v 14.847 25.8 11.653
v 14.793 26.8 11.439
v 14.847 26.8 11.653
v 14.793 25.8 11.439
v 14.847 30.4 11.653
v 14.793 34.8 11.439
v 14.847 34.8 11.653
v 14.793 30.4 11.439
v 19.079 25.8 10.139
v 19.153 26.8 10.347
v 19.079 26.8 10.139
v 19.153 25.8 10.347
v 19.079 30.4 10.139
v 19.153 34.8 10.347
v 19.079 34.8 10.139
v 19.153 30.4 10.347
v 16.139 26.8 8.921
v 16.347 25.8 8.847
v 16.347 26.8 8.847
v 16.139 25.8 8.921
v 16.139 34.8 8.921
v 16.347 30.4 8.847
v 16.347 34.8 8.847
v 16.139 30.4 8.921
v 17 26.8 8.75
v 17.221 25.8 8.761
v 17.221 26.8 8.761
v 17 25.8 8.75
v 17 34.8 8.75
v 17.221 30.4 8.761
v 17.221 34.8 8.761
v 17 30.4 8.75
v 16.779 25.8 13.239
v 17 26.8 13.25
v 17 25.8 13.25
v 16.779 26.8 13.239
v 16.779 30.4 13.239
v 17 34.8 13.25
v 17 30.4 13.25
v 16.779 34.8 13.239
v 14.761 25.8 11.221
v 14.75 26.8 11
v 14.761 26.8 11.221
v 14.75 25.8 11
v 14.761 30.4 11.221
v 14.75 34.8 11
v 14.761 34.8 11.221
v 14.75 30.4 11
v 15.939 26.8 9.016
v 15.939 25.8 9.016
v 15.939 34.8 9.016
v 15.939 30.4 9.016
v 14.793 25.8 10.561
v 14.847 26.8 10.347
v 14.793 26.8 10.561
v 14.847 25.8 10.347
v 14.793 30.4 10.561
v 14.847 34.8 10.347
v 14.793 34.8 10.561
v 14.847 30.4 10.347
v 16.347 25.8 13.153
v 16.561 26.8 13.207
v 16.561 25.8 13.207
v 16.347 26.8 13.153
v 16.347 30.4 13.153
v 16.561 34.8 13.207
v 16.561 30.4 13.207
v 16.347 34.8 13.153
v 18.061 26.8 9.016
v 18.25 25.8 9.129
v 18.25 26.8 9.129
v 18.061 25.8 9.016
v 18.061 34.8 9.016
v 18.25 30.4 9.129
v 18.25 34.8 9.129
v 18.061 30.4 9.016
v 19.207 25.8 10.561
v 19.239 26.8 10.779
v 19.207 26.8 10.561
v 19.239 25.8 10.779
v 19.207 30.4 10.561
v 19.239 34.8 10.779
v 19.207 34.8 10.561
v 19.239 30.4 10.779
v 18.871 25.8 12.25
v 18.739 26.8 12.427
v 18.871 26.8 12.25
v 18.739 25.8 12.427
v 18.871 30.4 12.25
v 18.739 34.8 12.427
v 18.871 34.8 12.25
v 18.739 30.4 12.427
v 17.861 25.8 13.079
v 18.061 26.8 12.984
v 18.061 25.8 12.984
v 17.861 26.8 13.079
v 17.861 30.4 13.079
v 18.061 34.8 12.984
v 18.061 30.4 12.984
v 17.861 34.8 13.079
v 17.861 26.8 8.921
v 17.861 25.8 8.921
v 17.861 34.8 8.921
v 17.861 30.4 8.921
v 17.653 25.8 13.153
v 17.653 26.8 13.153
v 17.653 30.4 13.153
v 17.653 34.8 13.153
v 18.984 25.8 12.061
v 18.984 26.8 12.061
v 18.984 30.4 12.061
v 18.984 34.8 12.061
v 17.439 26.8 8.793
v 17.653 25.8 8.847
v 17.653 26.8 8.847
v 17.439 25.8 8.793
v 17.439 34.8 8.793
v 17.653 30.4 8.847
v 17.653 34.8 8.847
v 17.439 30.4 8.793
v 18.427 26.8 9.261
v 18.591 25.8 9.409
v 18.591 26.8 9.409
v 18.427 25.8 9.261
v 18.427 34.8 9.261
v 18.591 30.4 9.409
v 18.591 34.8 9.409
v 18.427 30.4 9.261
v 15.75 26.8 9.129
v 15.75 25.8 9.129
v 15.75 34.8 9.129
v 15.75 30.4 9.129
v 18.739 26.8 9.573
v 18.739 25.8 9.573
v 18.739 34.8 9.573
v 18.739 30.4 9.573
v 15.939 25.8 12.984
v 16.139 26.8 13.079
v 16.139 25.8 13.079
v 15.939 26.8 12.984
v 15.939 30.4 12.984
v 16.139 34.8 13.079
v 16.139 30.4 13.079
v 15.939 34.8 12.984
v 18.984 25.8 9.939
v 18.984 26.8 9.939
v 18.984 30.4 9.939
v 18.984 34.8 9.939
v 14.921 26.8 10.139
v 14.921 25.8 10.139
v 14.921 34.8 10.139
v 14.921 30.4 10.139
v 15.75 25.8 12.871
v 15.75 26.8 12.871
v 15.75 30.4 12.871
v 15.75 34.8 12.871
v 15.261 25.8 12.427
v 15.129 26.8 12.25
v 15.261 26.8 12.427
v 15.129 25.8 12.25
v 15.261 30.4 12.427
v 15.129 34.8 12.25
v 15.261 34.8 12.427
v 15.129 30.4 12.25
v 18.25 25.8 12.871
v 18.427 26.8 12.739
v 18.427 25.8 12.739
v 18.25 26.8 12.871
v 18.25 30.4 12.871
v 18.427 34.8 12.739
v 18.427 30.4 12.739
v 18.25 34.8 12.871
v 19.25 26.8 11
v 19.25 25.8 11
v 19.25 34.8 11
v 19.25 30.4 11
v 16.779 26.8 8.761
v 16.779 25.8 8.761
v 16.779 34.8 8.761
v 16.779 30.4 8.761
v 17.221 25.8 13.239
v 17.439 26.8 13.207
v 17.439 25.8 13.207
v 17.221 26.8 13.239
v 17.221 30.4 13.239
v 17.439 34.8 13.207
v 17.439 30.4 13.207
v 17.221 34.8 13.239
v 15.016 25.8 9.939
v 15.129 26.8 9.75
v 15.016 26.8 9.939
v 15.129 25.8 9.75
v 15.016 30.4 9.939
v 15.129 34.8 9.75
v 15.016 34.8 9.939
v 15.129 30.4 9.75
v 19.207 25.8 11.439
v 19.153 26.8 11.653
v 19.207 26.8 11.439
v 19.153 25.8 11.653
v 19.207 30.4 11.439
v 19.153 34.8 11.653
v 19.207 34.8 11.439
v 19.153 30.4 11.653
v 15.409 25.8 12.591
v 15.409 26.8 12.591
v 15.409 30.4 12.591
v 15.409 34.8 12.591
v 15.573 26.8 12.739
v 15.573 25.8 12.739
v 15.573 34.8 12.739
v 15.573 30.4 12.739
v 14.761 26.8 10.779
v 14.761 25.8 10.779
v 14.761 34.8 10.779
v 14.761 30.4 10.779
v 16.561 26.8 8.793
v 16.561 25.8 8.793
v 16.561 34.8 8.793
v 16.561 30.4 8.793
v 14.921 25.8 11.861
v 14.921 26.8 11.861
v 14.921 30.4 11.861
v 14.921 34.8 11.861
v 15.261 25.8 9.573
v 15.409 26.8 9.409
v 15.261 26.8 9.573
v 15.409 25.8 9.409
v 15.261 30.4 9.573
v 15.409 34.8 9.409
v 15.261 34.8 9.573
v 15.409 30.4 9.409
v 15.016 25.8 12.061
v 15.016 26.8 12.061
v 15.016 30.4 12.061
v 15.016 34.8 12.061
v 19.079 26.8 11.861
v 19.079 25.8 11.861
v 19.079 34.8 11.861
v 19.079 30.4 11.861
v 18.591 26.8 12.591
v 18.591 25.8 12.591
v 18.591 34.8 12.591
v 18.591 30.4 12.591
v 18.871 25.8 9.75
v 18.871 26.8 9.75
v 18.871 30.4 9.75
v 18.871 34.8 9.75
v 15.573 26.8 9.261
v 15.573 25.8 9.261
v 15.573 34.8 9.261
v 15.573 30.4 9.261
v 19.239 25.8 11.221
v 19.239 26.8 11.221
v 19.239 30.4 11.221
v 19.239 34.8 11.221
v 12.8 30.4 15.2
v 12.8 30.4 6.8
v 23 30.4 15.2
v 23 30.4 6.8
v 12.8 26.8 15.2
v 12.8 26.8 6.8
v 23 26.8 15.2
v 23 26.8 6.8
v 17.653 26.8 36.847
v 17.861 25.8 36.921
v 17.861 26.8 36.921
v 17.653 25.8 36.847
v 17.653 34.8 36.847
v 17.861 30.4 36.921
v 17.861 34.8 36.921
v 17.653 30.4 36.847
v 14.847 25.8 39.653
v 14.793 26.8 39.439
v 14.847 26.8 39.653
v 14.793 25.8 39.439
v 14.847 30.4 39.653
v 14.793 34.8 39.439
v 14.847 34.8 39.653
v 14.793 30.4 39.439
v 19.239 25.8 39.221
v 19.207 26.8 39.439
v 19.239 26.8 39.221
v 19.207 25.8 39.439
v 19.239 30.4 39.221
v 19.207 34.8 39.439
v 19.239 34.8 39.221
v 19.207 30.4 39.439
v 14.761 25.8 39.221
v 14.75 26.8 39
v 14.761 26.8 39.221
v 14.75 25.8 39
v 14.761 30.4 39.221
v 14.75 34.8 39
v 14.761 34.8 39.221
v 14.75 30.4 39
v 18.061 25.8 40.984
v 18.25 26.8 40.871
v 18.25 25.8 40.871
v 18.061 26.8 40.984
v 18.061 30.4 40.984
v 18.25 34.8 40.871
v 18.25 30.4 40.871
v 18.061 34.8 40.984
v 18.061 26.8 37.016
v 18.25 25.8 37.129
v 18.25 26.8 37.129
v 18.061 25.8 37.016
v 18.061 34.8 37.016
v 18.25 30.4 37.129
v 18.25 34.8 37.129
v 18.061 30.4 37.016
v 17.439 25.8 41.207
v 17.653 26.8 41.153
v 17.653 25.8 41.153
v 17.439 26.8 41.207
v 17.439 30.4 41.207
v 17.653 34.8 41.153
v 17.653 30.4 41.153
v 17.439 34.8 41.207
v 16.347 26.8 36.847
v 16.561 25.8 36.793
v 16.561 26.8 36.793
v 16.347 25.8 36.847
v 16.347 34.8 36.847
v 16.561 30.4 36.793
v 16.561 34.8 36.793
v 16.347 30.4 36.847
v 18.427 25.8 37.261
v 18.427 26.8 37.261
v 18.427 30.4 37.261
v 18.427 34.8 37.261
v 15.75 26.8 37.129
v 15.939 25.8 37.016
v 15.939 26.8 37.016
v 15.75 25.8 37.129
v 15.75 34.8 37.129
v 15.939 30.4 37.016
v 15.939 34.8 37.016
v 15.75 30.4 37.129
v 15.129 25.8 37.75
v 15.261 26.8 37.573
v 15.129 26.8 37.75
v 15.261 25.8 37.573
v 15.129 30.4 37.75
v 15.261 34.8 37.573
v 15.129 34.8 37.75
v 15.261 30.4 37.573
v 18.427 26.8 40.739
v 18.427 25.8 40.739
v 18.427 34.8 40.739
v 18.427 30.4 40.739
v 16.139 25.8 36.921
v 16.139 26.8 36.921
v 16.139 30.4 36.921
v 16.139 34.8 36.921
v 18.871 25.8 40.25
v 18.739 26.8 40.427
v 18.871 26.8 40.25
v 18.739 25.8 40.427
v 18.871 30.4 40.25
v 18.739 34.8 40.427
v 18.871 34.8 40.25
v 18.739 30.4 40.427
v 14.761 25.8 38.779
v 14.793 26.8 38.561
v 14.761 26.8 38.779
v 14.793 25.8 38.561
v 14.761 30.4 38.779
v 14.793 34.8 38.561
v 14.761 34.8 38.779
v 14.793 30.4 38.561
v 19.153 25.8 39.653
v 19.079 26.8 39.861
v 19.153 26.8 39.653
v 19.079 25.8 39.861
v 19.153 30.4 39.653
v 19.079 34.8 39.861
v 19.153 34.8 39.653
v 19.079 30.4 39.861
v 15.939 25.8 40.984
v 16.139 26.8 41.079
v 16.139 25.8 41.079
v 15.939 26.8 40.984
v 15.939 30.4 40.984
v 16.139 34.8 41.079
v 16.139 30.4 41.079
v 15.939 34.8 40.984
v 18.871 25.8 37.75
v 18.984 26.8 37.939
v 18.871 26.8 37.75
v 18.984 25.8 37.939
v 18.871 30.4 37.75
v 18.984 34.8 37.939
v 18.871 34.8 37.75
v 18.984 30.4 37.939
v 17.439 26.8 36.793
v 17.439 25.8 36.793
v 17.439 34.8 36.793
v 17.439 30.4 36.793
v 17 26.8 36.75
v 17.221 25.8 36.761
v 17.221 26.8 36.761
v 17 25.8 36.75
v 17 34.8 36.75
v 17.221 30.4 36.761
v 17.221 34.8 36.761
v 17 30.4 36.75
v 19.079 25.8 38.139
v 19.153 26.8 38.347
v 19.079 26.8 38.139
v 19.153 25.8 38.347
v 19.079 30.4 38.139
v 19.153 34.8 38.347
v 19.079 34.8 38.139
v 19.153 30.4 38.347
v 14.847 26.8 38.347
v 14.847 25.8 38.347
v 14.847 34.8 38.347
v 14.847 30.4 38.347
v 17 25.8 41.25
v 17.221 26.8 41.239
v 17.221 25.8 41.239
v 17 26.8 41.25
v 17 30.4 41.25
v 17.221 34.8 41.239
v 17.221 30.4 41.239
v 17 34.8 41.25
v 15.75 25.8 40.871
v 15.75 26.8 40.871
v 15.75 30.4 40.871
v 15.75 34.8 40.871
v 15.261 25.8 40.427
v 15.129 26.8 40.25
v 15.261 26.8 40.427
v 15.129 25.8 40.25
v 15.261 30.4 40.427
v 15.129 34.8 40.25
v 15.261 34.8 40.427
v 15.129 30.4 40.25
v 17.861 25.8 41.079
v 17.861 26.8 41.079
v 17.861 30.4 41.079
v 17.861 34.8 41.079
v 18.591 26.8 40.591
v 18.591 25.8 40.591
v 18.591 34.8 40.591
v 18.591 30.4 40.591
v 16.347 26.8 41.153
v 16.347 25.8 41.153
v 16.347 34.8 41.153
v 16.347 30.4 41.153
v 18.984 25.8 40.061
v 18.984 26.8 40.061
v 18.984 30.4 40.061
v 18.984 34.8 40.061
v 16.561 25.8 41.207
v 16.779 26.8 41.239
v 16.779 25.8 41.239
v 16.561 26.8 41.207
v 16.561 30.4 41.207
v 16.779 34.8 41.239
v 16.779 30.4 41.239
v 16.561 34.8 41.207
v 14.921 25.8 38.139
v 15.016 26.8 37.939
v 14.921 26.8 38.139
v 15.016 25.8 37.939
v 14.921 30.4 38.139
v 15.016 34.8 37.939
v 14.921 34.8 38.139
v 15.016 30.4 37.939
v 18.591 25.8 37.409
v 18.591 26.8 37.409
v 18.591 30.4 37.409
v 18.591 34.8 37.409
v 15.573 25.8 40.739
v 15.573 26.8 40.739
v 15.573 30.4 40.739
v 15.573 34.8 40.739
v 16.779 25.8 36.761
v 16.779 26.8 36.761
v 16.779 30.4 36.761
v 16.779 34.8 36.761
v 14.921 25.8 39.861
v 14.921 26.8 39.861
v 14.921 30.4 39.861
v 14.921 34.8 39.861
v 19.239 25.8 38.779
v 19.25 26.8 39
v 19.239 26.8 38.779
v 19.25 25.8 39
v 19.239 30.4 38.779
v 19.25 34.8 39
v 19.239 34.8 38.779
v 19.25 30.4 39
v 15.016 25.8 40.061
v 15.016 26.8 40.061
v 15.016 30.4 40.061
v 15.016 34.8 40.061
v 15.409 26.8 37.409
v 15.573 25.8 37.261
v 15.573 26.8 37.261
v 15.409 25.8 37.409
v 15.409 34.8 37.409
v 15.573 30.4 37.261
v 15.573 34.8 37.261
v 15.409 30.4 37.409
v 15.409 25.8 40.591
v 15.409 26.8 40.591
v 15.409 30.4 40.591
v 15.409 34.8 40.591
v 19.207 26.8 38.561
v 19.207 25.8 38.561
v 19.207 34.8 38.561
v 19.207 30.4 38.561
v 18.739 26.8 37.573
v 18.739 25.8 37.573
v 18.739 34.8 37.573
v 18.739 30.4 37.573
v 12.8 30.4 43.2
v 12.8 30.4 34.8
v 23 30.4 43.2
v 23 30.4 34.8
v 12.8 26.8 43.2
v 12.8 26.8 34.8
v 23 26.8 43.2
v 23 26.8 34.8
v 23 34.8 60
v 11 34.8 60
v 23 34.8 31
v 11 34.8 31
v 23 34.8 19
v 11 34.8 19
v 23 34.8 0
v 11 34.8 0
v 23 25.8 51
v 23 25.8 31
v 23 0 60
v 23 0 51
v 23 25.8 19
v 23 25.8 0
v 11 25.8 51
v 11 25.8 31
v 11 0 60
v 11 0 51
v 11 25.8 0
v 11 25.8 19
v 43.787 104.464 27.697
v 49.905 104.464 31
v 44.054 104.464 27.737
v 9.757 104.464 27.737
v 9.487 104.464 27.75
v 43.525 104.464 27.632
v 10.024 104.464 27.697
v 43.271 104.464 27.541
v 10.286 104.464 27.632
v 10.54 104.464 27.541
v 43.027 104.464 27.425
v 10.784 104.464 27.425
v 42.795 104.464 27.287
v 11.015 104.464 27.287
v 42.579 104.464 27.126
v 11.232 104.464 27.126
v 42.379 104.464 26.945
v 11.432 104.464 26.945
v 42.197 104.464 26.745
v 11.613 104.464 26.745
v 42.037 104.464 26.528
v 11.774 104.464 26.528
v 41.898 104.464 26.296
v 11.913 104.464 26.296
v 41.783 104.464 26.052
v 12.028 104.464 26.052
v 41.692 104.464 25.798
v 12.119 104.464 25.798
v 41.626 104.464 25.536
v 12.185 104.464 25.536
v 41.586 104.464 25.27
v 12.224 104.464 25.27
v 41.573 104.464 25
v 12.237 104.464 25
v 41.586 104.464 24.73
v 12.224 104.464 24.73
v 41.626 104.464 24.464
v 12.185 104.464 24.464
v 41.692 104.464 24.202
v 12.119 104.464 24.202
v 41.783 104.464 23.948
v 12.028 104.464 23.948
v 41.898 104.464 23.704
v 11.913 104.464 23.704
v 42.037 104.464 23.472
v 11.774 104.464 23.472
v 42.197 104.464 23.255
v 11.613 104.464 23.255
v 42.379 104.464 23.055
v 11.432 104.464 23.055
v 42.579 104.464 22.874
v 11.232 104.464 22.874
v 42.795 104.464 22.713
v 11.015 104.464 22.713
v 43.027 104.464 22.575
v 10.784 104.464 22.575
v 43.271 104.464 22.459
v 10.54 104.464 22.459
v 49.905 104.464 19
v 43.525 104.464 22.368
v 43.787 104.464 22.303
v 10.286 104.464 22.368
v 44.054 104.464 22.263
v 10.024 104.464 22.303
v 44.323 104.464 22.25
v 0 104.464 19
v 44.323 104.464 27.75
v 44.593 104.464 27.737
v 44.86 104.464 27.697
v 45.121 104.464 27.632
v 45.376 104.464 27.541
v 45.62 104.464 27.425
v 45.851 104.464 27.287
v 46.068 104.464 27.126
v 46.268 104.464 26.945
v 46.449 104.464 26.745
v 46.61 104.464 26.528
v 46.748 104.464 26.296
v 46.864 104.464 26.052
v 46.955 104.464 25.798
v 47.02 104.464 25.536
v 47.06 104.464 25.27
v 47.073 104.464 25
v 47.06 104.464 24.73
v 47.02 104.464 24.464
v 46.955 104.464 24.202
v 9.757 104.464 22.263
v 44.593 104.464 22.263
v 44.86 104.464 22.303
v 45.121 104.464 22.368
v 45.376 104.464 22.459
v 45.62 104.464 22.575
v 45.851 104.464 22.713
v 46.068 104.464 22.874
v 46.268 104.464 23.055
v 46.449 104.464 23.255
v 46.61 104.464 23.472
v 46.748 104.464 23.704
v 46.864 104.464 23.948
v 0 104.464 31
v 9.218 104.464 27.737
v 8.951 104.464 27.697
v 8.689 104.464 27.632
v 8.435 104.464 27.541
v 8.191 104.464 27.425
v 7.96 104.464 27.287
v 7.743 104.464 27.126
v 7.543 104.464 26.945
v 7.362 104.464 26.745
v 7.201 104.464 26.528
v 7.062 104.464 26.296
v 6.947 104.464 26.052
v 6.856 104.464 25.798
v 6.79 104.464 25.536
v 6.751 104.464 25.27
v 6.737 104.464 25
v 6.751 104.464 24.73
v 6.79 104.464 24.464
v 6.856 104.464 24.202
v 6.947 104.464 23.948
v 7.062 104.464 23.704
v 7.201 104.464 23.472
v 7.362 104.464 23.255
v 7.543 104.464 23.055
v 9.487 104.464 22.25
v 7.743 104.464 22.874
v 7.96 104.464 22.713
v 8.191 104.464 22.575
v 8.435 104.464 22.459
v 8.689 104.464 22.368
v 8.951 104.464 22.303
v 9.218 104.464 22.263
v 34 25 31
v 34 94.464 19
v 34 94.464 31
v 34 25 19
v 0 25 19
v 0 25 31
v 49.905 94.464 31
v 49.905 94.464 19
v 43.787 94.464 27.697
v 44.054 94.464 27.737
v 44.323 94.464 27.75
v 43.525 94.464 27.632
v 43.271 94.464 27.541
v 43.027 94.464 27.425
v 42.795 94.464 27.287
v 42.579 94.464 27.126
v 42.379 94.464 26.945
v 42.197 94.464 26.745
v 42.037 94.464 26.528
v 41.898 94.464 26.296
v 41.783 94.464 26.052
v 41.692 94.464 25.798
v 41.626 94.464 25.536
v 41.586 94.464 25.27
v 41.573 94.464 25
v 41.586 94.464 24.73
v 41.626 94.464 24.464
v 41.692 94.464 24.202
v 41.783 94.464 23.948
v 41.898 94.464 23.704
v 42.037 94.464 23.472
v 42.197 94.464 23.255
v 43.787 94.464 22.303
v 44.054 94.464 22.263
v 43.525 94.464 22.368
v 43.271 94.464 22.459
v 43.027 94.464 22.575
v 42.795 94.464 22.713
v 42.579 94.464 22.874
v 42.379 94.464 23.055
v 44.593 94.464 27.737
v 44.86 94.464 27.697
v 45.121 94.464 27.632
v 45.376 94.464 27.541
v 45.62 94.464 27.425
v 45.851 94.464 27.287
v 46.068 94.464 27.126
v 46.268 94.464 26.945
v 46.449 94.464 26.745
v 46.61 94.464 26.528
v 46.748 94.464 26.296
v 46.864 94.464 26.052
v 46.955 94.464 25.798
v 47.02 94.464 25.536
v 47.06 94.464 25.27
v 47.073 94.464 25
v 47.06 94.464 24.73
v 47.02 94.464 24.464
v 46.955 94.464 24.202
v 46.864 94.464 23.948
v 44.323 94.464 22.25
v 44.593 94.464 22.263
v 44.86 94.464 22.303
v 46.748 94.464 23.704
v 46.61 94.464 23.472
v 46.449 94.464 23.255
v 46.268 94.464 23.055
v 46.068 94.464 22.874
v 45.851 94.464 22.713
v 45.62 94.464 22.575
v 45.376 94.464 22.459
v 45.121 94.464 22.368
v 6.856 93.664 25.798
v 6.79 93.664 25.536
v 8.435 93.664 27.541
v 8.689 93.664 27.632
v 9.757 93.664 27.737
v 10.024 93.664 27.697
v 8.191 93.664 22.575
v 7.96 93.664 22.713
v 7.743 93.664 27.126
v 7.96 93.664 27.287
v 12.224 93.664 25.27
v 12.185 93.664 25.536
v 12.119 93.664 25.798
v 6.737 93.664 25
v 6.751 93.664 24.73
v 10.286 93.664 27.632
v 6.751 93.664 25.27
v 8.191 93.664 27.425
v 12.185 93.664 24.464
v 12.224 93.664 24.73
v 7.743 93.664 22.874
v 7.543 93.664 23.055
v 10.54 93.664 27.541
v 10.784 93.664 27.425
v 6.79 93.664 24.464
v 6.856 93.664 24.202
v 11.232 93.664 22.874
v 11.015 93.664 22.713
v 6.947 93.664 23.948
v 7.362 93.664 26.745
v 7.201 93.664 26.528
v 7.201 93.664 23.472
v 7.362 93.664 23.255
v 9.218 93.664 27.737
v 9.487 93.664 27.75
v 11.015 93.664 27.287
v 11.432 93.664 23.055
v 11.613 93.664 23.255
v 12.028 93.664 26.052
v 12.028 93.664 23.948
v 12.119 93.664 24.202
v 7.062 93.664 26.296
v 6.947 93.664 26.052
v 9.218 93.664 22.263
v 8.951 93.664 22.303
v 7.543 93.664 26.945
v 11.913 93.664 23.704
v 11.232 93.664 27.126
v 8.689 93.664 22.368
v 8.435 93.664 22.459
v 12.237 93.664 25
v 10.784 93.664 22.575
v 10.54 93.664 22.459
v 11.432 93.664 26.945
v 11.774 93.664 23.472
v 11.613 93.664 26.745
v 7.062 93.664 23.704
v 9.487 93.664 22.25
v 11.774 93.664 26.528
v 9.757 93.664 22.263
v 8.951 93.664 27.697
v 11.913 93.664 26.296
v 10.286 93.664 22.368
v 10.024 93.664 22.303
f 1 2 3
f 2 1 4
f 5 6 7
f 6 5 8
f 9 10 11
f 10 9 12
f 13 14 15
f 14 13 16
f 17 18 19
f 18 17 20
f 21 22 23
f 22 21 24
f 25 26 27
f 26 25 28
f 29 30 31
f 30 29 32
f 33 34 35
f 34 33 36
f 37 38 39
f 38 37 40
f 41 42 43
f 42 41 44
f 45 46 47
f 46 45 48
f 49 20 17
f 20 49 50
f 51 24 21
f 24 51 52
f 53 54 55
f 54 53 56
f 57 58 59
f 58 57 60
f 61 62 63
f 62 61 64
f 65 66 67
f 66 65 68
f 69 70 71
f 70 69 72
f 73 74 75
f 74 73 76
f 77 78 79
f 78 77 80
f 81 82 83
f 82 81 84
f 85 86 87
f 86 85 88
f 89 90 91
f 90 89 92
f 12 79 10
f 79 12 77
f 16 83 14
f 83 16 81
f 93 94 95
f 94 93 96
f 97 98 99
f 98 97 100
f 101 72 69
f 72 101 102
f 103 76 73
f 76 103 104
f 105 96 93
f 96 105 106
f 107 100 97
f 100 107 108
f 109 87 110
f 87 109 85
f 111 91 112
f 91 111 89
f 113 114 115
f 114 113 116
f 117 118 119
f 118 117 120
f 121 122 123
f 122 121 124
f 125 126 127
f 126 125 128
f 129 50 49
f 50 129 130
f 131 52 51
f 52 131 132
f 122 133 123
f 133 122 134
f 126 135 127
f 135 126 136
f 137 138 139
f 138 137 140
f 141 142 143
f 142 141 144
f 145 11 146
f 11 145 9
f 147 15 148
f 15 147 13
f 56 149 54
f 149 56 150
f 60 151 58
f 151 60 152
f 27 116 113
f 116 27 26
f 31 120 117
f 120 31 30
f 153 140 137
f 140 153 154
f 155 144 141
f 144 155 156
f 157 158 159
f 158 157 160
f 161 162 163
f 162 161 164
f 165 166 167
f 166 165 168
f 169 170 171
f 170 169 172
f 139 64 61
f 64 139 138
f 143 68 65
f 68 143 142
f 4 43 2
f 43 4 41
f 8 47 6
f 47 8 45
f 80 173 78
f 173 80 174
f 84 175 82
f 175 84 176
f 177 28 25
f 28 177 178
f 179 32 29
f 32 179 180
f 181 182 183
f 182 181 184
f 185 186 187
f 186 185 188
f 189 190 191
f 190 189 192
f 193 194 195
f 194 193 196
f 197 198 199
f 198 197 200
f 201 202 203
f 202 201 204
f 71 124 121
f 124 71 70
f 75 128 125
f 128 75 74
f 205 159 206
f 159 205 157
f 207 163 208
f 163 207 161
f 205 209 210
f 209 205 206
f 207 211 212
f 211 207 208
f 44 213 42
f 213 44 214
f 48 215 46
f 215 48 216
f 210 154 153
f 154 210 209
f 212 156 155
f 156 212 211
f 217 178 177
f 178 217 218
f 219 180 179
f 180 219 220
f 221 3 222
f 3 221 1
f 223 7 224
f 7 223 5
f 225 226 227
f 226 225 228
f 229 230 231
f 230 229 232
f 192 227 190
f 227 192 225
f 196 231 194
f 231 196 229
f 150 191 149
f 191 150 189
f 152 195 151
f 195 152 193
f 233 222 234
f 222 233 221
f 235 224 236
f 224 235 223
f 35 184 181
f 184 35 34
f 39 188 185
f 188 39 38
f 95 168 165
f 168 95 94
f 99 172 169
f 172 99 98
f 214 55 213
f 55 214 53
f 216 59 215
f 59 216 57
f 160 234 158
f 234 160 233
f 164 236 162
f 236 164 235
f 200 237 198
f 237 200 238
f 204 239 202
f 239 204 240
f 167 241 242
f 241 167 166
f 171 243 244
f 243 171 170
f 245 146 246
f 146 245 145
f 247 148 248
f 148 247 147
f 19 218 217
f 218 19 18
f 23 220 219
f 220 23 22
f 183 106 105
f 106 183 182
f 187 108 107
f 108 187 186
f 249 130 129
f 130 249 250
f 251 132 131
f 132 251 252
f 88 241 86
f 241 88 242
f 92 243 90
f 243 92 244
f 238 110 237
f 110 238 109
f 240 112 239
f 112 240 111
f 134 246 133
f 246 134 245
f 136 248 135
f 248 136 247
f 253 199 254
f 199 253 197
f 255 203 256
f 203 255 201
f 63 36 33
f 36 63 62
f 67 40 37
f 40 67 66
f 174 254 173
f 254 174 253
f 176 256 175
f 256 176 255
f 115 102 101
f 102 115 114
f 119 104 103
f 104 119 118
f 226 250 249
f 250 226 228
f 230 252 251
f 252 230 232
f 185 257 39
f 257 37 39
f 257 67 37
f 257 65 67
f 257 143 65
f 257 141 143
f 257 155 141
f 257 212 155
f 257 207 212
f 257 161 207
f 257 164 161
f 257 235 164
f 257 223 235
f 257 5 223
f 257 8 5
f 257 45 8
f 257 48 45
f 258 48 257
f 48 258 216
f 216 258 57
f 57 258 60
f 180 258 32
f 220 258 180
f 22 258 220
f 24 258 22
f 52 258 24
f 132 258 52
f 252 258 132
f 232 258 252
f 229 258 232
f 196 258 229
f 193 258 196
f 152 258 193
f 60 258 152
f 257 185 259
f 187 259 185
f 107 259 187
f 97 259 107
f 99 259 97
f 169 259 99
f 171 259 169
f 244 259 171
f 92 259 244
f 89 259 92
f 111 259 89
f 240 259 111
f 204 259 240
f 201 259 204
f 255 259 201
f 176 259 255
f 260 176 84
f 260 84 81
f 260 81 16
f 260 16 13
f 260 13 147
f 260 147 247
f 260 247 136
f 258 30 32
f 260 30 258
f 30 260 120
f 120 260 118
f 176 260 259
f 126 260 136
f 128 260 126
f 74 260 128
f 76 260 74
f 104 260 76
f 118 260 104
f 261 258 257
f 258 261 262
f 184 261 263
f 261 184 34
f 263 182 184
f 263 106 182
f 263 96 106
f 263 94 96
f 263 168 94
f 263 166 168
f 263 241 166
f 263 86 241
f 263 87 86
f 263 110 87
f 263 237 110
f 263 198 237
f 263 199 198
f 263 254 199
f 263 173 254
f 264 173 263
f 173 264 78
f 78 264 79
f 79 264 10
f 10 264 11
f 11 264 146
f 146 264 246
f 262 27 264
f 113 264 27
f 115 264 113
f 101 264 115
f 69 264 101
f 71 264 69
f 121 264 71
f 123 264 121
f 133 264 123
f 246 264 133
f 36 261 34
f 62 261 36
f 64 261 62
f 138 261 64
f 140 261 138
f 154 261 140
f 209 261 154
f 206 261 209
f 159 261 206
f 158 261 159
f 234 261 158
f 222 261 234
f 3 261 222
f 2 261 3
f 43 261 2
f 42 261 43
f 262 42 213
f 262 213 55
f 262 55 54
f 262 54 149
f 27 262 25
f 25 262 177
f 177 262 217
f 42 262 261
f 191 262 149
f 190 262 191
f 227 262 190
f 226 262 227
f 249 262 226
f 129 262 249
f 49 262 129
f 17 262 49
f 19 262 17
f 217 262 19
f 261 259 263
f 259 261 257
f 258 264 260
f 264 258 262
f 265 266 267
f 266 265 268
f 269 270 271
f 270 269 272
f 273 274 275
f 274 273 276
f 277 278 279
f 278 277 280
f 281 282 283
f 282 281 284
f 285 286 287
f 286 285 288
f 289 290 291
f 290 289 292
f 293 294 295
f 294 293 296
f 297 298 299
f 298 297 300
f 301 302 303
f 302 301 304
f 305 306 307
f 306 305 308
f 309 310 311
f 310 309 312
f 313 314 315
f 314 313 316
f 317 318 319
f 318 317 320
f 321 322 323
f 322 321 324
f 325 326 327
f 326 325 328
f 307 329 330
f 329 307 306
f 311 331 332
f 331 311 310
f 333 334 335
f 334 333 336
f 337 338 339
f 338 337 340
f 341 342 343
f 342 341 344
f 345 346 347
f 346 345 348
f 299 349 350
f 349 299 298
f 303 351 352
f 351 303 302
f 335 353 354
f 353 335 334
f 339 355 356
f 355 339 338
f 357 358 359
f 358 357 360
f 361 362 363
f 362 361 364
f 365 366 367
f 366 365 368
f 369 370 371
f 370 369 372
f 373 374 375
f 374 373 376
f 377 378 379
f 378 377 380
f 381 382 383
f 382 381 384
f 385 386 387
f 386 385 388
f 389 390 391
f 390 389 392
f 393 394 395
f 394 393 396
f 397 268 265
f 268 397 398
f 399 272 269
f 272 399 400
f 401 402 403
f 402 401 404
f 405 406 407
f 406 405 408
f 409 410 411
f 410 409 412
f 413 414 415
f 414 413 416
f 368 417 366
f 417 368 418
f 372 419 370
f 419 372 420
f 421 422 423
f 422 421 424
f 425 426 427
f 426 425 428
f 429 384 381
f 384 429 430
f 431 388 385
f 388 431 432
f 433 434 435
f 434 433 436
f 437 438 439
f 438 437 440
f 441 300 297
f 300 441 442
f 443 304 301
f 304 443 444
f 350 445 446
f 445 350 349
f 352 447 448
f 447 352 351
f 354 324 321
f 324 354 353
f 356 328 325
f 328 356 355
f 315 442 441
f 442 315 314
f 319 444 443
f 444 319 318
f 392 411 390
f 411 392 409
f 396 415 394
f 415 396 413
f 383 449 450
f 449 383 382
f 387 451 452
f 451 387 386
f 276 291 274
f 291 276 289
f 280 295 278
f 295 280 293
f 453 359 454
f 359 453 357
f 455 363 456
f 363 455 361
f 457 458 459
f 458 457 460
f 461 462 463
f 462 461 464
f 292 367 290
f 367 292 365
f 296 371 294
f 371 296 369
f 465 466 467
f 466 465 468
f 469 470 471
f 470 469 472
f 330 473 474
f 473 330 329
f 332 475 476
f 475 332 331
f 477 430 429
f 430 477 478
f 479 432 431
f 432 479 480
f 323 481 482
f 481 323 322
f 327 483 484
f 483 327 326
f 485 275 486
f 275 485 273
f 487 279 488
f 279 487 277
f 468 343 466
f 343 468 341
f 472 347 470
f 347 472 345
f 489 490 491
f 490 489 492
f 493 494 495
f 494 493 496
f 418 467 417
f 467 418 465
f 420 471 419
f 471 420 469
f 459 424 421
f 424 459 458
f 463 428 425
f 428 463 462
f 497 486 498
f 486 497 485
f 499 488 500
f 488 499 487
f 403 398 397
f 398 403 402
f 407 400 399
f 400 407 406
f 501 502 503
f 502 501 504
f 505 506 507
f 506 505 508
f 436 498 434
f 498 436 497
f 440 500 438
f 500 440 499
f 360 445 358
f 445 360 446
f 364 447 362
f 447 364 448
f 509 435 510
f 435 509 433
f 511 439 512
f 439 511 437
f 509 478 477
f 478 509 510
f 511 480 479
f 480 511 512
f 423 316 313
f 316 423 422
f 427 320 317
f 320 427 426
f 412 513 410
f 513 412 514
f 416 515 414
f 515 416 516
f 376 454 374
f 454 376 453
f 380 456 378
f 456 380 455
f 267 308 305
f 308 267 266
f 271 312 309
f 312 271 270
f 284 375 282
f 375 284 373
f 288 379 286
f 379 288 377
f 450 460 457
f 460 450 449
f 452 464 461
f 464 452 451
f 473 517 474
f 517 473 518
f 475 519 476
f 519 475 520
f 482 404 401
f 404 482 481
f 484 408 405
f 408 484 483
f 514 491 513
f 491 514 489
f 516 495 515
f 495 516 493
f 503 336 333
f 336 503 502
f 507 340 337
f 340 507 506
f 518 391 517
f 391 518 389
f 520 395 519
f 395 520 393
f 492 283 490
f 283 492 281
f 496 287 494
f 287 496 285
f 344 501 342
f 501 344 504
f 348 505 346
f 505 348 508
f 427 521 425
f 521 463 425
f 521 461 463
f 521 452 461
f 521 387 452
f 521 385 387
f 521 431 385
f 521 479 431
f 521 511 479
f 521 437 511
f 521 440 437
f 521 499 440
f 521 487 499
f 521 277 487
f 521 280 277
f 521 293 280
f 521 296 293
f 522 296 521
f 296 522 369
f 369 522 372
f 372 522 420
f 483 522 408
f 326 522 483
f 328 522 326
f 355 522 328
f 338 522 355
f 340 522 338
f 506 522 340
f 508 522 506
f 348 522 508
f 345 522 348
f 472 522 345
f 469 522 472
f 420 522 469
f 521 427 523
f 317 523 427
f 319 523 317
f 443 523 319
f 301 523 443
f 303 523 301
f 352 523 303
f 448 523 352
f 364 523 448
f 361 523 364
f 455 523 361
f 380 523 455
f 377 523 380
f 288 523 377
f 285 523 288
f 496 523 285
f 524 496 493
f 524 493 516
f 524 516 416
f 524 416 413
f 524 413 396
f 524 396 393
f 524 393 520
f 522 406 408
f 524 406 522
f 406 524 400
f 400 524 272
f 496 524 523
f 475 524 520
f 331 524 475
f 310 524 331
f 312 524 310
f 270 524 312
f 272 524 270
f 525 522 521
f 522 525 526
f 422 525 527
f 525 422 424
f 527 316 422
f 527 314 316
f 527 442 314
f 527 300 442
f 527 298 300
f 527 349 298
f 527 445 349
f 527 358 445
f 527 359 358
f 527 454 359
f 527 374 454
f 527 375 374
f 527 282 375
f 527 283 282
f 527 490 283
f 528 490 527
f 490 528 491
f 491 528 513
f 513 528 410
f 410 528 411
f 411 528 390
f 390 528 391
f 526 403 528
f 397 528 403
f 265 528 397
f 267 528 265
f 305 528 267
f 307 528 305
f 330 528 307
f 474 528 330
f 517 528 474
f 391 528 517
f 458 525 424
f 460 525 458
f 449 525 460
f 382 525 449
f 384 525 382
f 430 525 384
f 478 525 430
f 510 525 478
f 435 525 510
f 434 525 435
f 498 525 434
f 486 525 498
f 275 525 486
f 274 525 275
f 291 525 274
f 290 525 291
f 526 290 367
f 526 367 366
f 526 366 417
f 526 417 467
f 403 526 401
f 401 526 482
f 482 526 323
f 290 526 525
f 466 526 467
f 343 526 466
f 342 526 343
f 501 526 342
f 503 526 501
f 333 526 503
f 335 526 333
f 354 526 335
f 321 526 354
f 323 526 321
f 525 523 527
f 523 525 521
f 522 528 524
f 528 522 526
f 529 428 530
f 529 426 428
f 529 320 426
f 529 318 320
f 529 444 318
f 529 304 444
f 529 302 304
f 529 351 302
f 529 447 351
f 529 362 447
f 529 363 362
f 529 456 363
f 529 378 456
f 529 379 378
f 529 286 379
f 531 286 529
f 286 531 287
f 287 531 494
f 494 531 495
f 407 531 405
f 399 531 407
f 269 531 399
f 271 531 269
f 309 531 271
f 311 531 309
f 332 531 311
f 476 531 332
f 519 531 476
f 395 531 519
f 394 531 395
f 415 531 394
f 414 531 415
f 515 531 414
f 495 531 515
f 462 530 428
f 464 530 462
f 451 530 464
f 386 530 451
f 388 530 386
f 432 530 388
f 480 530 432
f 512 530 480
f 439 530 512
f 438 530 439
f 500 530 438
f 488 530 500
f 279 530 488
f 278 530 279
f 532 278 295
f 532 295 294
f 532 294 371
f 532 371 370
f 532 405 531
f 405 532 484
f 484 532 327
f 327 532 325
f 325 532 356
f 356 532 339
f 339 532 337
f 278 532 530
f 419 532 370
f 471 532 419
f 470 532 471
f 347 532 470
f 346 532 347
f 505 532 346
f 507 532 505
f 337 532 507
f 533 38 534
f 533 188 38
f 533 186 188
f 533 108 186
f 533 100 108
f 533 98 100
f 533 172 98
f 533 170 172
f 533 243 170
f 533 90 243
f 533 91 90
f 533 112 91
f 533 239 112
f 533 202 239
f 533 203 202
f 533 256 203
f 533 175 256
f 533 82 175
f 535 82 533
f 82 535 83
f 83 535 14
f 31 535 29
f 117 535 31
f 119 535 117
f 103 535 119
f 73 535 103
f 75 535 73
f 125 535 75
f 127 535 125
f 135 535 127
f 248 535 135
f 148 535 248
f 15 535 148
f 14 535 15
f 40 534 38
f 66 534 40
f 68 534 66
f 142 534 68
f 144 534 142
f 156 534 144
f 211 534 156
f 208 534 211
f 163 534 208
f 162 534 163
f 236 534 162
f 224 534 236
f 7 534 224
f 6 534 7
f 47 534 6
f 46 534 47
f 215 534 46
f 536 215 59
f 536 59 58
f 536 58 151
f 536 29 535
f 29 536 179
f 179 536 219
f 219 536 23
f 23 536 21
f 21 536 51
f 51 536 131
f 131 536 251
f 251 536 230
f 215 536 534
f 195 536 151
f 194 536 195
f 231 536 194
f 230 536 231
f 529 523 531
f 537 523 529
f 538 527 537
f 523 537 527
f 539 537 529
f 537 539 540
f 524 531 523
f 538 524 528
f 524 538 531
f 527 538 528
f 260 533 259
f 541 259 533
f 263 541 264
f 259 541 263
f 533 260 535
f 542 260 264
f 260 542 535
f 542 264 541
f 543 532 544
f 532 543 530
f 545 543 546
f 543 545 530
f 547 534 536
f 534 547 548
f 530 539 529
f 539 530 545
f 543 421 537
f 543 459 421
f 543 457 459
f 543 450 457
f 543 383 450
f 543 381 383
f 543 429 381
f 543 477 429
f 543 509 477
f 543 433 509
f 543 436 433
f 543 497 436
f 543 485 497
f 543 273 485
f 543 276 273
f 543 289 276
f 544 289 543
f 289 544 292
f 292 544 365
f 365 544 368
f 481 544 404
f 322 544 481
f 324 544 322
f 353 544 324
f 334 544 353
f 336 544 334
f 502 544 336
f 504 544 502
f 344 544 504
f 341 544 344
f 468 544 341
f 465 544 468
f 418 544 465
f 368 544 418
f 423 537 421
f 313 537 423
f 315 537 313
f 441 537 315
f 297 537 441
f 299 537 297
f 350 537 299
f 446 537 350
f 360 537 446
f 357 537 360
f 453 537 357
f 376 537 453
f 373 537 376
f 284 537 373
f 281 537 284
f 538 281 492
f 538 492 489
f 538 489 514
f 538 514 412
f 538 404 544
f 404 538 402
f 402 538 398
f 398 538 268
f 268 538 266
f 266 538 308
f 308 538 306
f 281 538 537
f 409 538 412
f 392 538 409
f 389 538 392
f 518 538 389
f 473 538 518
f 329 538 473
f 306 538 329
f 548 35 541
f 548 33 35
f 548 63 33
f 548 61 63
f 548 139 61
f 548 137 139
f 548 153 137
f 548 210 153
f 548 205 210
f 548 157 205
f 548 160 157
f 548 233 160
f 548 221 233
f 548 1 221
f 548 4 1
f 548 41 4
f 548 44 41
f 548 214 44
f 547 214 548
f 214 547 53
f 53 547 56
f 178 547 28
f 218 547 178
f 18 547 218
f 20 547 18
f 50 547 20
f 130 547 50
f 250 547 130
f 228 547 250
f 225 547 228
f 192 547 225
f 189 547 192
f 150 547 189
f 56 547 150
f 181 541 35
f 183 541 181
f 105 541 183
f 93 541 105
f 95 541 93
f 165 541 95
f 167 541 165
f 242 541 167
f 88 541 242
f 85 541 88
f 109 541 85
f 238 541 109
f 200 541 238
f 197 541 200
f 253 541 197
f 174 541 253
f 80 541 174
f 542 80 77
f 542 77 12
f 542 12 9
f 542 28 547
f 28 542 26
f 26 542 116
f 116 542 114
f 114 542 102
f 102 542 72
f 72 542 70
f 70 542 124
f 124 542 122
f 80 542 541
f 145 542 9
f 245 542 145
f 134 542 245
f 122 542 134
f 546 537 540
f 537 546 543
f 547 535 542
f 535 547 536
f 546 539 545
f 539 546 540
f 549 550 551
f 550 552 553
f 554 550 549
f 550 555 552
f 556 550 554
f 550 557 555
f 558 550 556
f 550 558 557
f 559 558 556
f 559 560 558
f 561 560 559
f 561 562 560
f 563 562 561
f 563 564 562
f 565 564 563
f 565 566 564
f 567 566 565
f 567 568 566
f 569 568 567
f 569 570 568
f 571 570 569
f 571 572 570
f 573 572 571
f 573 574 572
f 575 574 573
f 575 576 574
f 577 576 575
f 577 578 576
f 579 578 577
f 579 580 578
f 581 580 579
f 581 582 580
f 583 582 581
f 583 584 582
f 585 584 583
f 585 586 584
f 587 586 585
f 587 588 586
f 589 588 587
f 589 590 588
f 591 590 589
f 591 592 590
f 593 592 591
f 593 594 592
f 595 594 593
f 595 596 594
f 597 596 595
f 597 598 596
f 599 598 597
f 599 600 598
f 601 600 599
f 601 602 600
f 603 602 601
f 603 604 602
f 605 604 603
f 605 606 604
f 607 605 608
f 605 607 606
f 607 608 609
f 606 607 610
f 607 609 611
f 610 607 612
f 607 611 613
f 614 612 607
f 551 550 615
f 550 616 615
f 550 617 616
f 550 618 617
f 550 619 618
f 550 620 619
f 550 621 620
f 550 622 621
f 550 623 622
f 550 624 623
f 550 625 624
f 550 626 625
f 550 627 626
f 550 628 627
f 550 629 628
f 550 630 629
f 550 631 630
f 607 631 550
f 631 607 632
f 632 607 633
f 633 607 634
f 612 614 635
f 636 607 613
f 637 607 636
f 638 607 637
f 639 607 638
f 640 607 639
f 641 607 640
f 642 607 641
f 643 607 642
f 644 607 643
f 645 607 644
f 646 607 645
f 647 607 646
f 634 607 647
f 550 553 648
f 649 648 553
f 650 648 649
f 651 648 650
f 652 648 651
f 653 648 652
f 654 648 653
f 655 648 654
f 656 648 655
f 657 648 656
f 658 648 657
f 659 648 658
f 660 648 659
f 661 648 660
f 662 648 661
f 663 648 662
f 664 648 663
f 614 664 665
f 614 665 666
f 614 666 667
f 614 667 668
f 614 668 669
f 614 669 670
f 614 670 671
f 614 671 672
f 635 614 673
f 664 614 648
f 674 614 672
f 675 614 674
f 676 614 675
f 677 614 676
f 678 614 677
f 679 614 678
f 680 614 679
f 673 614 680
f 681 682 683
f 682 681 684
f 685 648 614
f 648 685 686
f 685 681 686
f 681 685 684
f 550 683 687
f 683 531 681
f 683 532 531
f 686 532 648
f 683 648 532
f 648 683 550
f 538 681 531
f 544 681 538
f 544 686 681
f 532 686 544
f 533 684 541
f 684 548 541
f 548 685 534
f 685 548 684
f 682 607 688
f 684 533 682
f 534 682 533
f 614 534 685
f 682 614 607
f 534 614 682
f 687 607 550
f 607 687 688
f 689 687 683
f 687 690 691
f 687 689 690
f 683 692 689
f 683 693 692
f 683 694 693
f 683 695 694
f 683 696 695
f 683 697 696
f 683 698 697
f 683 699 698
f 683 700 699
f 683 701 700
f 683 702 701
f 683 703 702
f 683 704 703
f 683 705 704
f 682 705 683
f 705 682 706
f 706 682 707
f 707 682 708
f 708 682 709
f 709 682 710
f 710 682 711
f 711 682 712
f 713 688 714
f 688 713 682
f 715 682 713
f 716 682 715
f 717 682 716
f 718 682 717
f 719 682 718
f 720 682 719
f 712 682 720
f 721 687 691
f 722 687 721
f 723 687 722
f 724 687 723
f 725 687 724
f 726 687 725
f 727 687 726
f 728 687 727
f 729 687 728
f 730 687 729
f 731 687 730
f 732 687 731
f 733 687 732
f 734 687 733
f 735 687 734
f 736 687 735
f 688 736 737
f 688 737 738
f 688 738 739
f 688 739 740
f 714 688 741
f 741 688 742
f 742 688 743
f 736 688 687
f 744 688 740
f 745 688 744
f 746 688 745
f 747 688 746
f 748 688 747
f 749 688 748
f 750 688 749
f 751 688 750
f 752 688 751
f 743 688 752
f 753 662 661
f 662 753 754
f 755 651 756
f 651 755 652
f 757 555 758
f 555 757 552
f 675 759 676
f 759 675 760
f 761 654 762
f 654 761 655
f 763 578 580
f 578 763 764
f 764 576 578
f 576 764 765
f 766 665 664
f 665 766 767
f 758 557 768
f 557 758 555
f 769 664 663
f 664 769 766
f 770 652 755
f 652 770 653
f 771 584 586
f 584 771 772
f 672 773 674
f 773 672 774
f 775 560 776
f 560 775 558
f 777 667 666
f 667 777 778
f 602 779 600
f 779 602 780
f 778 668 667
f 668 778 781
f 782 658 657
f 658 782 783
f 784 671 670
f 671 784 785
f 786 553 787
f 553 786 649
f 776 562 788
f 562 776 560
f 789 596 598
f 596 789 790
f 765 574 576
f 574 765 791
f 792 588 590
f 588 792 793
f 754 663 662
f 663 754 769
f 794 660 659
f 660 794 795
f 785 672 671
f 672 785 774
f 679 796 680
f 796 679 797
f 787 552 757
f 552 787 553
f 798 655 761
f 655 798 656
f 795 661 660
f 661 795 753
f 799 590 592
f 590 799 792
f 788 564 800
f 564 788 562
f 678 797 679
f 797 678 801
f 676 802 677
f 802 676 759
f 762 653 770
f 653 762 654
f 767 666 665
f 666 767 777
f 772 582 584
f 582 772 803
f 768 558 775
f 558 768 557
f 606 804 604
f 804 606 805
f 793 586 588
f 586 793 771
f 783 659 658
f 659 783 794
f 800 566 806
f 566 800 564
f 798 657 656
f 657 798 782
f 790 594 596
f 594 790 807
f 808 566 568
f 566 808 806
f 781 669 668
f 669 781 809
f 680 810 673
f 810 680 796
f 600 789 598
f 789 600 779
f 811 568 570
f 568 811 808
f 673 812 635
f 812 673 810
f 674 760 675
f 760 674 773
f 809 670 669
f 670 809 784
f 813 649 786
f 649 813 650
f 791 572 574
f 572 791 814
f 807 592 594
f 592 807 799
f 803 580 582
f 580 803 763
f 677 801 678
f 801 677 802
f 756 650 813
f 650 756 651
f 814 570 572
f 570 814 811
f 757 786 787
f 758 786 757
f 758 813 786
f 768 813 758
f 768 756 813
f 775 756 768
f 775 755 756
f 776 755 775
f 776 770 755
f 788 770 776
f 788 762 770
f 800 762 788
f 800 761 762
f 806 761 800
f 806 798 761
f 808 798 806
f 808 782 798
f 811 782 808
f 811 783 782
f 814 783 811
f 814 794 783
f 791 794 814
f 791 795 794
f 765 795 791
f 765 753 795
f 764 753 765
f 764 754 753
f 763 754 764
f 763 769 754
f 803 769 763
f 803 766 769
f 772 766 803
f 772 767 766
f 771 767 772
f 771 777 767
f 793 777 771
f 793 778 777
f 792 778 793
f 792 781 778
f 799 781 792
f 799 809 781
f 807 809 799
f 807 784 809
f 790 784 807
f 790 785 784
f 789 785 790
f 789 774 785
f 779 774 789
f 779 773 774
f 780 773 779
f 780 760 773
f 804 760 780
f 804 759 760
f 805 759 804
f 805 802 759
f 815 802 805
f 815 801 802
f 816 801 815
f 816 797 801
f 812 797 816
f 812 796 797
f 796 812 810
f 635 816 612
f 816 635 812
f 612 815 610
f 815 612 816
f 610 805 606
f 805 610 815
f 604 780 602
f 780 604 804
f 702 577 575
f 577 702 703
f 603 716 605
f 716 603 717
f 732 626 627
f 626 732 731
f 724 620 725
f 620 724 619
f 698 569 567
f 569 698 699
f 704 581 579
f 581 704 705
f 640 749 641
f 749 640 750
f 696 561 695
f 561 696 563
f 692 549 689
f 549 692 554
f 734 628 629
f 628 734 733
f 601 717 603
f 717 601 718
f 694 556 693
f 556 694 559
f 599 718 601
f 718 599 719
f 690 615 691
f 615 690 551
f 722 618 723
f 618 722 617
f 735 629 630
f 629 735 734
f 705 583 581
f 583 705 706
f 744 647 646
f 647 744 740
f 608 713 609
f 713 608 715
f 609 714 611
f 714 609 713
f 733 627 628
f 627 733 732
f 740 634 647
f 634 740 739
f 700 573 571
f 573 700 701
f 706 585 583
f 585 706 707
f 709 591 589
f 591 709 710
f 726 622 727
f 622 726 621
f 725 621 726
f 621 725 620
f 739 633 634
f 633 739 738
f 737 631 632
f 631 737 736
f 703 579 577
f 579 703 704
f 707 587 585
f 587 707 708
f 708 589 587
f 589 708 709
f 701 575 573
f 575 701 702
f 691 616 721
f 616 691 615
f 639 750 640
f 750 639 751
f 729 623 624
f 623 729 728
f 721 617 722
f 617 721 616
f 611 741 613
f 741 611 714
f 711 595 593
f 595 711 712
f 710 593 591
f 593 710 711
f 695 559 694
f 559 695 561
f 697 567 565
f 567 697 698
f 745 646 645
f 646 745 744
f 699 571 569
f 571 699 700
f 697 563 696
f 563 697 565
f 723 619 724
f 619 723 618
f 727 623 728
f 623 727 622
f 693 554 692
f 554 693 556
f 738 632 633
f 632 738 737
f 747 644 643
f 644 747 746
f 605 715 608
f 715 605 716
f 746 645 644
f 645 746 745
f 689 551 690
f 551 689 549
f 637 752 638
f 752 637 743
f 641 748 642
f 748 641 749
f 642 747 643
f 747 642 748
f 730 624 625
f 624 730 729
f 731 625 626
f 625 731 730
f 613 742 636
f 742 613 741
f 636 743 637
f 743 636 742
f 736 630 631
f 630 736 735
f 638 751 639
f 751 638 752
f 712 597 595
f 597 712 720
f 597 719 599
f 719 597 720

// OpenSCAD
// file: common.scad
// Shared dimensions in mm; FDM fit allowances are design choices, not tolerances
// guaranteed by vendors. Exact mower model/serial and printer remain unknown.
// 76.2 x 38.1 rectangular rail is an UNVERIFIED selected envelope, not a
// specification for all TimeCutters (Toro also sells C-channel frames).
$fn = 64;
frame_rail_w = 76.2;                // depth wrapped by square U-bolt
frame_rail_h = 38.1;                // contact face width between U-bolt legs
frame_ubolt_inside_w = 40;
frame_ubolt_leg_nominal_d = 8;
frame_ubolt_center_pitch = frame_ubolt_inside_w + frame_ubolt_leg_nominal_d;
frame_ubolt_leg_hole_d = 9;
frame_ubolt_backing_t = 3;
frame_ubolt_washer_t = 2.4;
frame_ubolt_nut_h = 8;
frame_ubolt_thread_projection = 3;  // beyond full nut, not a second nut engagement
// Four-bolt printed steering-bar clamp. The 25.4 mm tube is only a coupon default;
// measure the actual lap-bar tube and tune its fit before printing working clamps.
clamp_tube_od_mm = 25.4;
clamp_tube_clearance_mm = 0.4;
clamp_shell_mm = 10;
clamp_bolt_x_mm = 18;
clamp_bolt_clear_mm = 5.5;          // four M5 clamp bolts
clamp_nut_af_mm = 8.2;
clamp_nut_depth_mm = 4.8;
clamp_pin_bore_mm = 6.6;
clamp_rod_eye_length_mm = 32;
clamp_rod_eye_width_mm = 20;
clamp_rod_eye_t_mm = 8;             // printed single-eye lug thickness
clamp_rod_gap_mm = 9;               // yoke clearance around the eye, nominally 0.5 mm per side
clamp_yoke_span_mm = 42;            // ear width clears the eye through its planar sweep
clamp_yoke_reach_mm = 42;           // total outboard yoke extension from the clamp body
clamp_yoke_root_overlap_mm = 4;     // fuse each printed ear into its half beyond the bar opening
clamp_yoke_sweep_clearance_mm = 1;
clamp_gauge_wall_mm = 5;
clamp_r_mm = (clamp_tube_od_mm + clamp_tube_clearance_mm) / 2;
clamp_half_h_mm = clamp_r_mm + clamp_shell_mm;
clamp_bolt_y_mm = clamp_r_mm + 7;
clamp_w_mm = 2 * (clamp_bolt_y_mm + clamp_shell_mm);
clamp_l_mm = 2 * (clamp_bolt_x_mm + 7);
clamp_gauge_index = 1;

function clamp_rod_eye_sweep_radius_mm() =
    sqrt(pow(clamp_rod_eye_length_mm/2, 2) + pow(clamp_rod_eye_width_mm/2, 2));

// Exact listing's RDS51150 stationary-holder SIDE drawing, not bottom holes.
// RDS51150 vs purchased RDS51150SG revision must be confirmed with the coupon.
servo_side_hole_pitch = 24;
servo_side_hole_clear_d = 2.9;       // M2.5 with 0.4 mm diametral allowance
servo_side_tool_bore_d = 6;
m3_clear = 3.4;
m4_clear = 4.5;
m5_clear = 5.5;
m6_clear = 6.4;
m8_clear = 8.4;
wall = 5;
clearance = 0.4;

function frame_ubolt_required_leg_length(saddle_t) =
    frame_rail_w + saddle_t + frame_ubolt_backing_t + frame_ubolt_washer_t +
    frame_ubolt_nut_h + frame_ubolt_thread_projection;
function saddle_width(pitch, bore) = pitch + bore + 2 * wall;


module slot(d, len, h) {
    hull() for (x = [-len / 2, len / 2]) translate([x, 0, 0]) cylinder(h = h, d = d);
}
module plate(l, w, t, r = 6) {
    assert(l >= 2 * r && w >= 2 * r && t > 0);
    hull() for (x = [-1, 1], y = [-1, 1])
        translate([x * (l / 2 - r), y * (w / 2 - r), 0]) cylinder(h = t, r = r);
}
module frame_saddle(l, t, span, leg = frame_ubolt_leg_hole_d) {
    assert(l / 2 - span / 2 - leg / 2 >= 5, "U-bolt hole too near saddle end");
    plate(l, saddle_width(frame_ubolt_center_pitch, leg), t, 8);
}
module frame_ubolt_slots(t, span, leg = frame_ubolt_leg_hole_d) {
    for (x = [-1, 1], y = [-1, 1])
        translate([x * span / 2, y * frame_ubolt_center_pitch / 2, -1]) cylinder(h = t + 2, d = leg);
}
// main file
// Printed, front-fitted sway bars tying each arm to the camera tower.
// Each handed half-jaw occupies only its side of the tower centre plane.
// Together the halves form a rear-open U, fitted from +Y toward the box.
// The intact outboard wall carries the bar. Two short M4 screws per half
// bear outside the tube; neither the jaw nor screws enter the USB cable bore.
// These are first-article position braces, not a qualified steering load path.
//
// LOAD: these are sway/position bars, not the primary steering load path. The
// servo reaction still goes servo -> arm -> sandwich layer -> hitch plate, and that
// path is unqualified. A bar or pad failure is a stop-work condition, not a
// tolerable mode. Printed ASA only; no strength, fatigue or creep claim is made
// for any of it. Bench-load before powered steering.
//
// Print each bar Lying flat (broad face on the bed) so the in-plane bending stress
// runs along the filament, the same rule as camera_tower.scad's segments.
include <enclosure_common.scad>
arm_brace_part = "bar_0";      // bar_0 | bar_1 | bar_2
arm_brace_side = "right";      // right | left; explicit handed print variants

// The selected part's station index. indexOf on a list is not available in this
// OpenSCAD, so the station is selected by name.
function arm_brace_index() =
    arm_brace_part == "bar_0" ? 0 : arm_brace_part == "bar_1" ? 1 : 2;
function arm_brace_station_z() = arm_brace_z[arm_brace_index()];
// A column pad's inboard mate face is a plane of constant assembly X. The
// local wedge's slope cancels the arm's rake; the offset comes from the same
// plane equation used by arm_pad_x_at(), not from an STL measurement.
function arm_brace_station_pad_x(i) =
    arm_point(arm_brace_t(arm_brace_z[i]))[0] + arm_brace_mate_x();
// Keep the printed bar just shy of the pad; M5 clamping closes the gap.
arm_brace_bar_clearance = 0.2;
function arm_brace_bar_len(i = -1) =
    arm_brace_station_pad_x(i < 0 ? arm_brace_index() : i)
    - tower_od/2 - arm_brace_bar_clearance;
function arm_brace_gusset_t() = 10;
function arm_brace_gusset_w() = arm_brace_bar_w+12;
// The wedge is raked, so its two M5 centres on the plane x=mate_x land
// ABOVE the arm axis: z_local = -mate_x*tan(rake) +/- pitch/(2*cos).
// Both the bar's bores and its end land use this shared projection.
function arm_brace_bolt_shift() = -arm_brace_mate_x()*tan(arm_rake_deg);
function arm_brace_bolt_z(sign) =
    arm_brace_bolt_shift() + sign*arm_brace_pad_bolt_pitch/(2*arm_cos());

assert(arm_brace_part == "bar_0" || arm_brace_part == "bar_1"
       || arm_brace_part == "bar_2", "arm_brace_part must be bar_0, bar_1 or bar_2");
assert(arm_brace_side == "right" || arm_brace_side == "left",
       "arm_brace_side must be right or left");
assert(arm_brace_pair_gap > 0 && arm_brace_pair_gap < tower_od,
       "Handed jaws need a positive centre gap smaller than the tower");
assert(arm_brace_z[0] - arm_brace_bar_w/2 > tongue_gusset_h,
       "Lowest sway web runs into the tongue gussets");
assert(arm_brace_z[0] + arm_brace_collar_t/2 < tower_base_top_z-tower_flange_t
       && arm_brace_z[1] - arm_brace_gusset_w()/2
          > tower_base_top_z+tower_flange_t,
       "Sway bars overlap the tower or segment joint flange");
assert(arm_brace_bar_len() > arm_brace_gusset_t(),
       "Pad face is too close to the tower column for the bar gusset");

// Keep the outboard +X wall and half the front wall, with the rear (-Y) open.
// Mirroring this half at the opposite arm leaves the shared centre gap.
// Approach from +Y AFTER the tower is built; -Y would drive the front wall
// through the tube. Captured M4 nuts are top-loaded and screws bear outside.
module arm_brace_collar() {
    difference() {
        cube([arm_brace_collar_od,arm_brace_collar_od,arm_brace_collar_t],
             center=true);
        cube([arm_brace_collar_id,arm_brace_collar_id,
              arm_brace_collar_t+2],center=true);
        translate([-arm_brace_collar_od/2-1,-arm_brace_collar_od/2-1,
                   -arm_brace_collar_t/2-1])
            cube([arm_brace_collar_od+2,
                  (arm_brace_collar_od-arm_brace_collar_id)/2+2,
                  arm_brace_collar_t+2]);
        // Remove the opposite half: two complete collars cannot share a station.
        translate([-arm_brace_collar_od/2-1,-arm_brace_collar_od/2-1,
                   -arm_brace_collar_t/2-1])
            cube([arm_brace_collar_od/2+arm_brace_pair_gap/2+1,
                  arm_brace_collar_od+2,arm_brace_collar_t+2]);
        for(y=[-arm_brace_collar_bolt_y,arm_brace_collar_bolt_y]) {
            translate([tower_od/2-1,y,0]) rotate([0,90,0])
                cylinder(d=m4_clear,
                         h=(arm_brace_collar_od-tower_od)/2+3);
            // 3.6 mm-deep M4 nut trap behind 4.4 mm of the outer wall;
            // top-entry slot permits assembly without an unsupported insert.
            translate([tower_od/2+2,y-4.2,-4.2])
                cube([3.6,8.4,8.4]);
            translate([tower_od/2+2,y-4.2,4.2])
                cube([3.6,8.4,arm_brace_collar_t/2-4.2+0.5]);
        }
    }
}
// The bar proper, in a frame whose origin is the tower column axis, +Z up, +X
// outboard along the bar. Its +X end face is the pad mating face.
// i selects the station; defaulting to the selected part keeps the single-part
// render identical while letting the assembly view draw all three at true length.
module arm_brace_bar(i = -1) {
    idx = i < 0 ? arm_brace_index() : i;
    len = arm_brace_bar_len(idx);
    face = arm_brace_station_pad_x(idx);
    difference() {
        union() {
            arm_brace_collar();
            translate([tower_od/2+0.2,-arm_brace_bar_t/2,-arm_brace_bar_w/2])
                cube([len-0.2,arm_brace_bar_t,arm_brace_bar_w]);
            translate([face-arm_brace_bar_clearance-arm_brace_gusset_t(),
                       -arm_brace_bar_t/2,
                       arm_brace_bolt_shift()-arm_brace_gusset_w()/2])
                cube([arm_brace_gusset_t(),arm_brace_bar_t,arm_brace_gusset_w()]);
        }
        // Both M5 bores must meet the raked pad's two nut pockets in the
        // assembled frame. Drill through the far-end gusset and the face.
        for(sign=[-1,1])
            translate([face-arm_brace_gusset_t()-1,0,arm_brace_bolt_z(sign)])
                rotate([0,90,0])
                    cylinder(d=m5_clear,h=arm_brace_gusset_t()+2);
    }
}
module arm_brace_bar_at(i) {
    translate([0,arm_brace_y,arm_brace_z[i]]) arm_brace_bar(i);
}
// All three stations at once, for the assembly view.
module arm_brace_bars_assembly() { for(i=[0:2]) arm_brace_bar_at(i); }
// One side's full set. The convention MUST match arm_assembly_side(): side < 0 is the
// right-hand (+x) side, unmirrored; side > 0 is the left (-x) side, mirrored. These two
// used to be inverted relative to each other, so the assembly view drew every bar
// across the machine to the opposite arm.
module arm_brace_bars_side(side) {
    if (side < 0) arm_brace_bars_assembly();
    else mirror([1,0,0]) arm_brace_bars_assembly();
}

// rotate([90,0,90]) sends local (x,y,z) to bed (z,x,y).
// Derive each handed part's minimum X before rotation; the rear-wall cut
// and long web determine the other two minima.
module arm_brace_bar_print() {
    min_x = arm_brace_side == "left"
        ? -arm_brace_station_pad_x(arm_brace_index())+arm_brace_bar_clearance
        : arm_brace_pair_gap/2;
    translate([arm_brace_bar_w/2,-min_x,arm_brace_collar_id/2-1])
        rotate([90,0,90])
            if(arm_brace_side == "left") mirror([1,0,0]) arm_brace_bar();
            else arm_brace_bar();
}

// The contact probes sample each actual pad independently; this ECHO is
// diagnostic only and cannot substitute for built-solid clearance checks.
echo(str("arm_support: ", arm_brace_part, " station z=", arm_brace_station_z(),
         " bar_len_mm=", arm_brace_bar_len(),
         " tower_face_x=", tower_od/2,
         " pad_face_x=", arm_brace_station_pad_x(arm_brace_index()),
         " side=", arm_brace_side,
         " print envelope=", arm_brace_station_pad_x(arm_brace_index())
             -arm_brace_bar_clearance-arm_brace_pair_gap/2, " x ",
         arm_brace_collar_od, " x ", arm_brace_gusset_w(), " mm; sway only, not the",
         " steering load path"));

if(arm_brace_part == "bar_0" || arm_brace_part == "bar_1"
   || arm_brace_part == "bar_2") arm_brace_bar_print();
else assert(false,"arm_brace_part must be bar_0, bar_1 or bar_2");
